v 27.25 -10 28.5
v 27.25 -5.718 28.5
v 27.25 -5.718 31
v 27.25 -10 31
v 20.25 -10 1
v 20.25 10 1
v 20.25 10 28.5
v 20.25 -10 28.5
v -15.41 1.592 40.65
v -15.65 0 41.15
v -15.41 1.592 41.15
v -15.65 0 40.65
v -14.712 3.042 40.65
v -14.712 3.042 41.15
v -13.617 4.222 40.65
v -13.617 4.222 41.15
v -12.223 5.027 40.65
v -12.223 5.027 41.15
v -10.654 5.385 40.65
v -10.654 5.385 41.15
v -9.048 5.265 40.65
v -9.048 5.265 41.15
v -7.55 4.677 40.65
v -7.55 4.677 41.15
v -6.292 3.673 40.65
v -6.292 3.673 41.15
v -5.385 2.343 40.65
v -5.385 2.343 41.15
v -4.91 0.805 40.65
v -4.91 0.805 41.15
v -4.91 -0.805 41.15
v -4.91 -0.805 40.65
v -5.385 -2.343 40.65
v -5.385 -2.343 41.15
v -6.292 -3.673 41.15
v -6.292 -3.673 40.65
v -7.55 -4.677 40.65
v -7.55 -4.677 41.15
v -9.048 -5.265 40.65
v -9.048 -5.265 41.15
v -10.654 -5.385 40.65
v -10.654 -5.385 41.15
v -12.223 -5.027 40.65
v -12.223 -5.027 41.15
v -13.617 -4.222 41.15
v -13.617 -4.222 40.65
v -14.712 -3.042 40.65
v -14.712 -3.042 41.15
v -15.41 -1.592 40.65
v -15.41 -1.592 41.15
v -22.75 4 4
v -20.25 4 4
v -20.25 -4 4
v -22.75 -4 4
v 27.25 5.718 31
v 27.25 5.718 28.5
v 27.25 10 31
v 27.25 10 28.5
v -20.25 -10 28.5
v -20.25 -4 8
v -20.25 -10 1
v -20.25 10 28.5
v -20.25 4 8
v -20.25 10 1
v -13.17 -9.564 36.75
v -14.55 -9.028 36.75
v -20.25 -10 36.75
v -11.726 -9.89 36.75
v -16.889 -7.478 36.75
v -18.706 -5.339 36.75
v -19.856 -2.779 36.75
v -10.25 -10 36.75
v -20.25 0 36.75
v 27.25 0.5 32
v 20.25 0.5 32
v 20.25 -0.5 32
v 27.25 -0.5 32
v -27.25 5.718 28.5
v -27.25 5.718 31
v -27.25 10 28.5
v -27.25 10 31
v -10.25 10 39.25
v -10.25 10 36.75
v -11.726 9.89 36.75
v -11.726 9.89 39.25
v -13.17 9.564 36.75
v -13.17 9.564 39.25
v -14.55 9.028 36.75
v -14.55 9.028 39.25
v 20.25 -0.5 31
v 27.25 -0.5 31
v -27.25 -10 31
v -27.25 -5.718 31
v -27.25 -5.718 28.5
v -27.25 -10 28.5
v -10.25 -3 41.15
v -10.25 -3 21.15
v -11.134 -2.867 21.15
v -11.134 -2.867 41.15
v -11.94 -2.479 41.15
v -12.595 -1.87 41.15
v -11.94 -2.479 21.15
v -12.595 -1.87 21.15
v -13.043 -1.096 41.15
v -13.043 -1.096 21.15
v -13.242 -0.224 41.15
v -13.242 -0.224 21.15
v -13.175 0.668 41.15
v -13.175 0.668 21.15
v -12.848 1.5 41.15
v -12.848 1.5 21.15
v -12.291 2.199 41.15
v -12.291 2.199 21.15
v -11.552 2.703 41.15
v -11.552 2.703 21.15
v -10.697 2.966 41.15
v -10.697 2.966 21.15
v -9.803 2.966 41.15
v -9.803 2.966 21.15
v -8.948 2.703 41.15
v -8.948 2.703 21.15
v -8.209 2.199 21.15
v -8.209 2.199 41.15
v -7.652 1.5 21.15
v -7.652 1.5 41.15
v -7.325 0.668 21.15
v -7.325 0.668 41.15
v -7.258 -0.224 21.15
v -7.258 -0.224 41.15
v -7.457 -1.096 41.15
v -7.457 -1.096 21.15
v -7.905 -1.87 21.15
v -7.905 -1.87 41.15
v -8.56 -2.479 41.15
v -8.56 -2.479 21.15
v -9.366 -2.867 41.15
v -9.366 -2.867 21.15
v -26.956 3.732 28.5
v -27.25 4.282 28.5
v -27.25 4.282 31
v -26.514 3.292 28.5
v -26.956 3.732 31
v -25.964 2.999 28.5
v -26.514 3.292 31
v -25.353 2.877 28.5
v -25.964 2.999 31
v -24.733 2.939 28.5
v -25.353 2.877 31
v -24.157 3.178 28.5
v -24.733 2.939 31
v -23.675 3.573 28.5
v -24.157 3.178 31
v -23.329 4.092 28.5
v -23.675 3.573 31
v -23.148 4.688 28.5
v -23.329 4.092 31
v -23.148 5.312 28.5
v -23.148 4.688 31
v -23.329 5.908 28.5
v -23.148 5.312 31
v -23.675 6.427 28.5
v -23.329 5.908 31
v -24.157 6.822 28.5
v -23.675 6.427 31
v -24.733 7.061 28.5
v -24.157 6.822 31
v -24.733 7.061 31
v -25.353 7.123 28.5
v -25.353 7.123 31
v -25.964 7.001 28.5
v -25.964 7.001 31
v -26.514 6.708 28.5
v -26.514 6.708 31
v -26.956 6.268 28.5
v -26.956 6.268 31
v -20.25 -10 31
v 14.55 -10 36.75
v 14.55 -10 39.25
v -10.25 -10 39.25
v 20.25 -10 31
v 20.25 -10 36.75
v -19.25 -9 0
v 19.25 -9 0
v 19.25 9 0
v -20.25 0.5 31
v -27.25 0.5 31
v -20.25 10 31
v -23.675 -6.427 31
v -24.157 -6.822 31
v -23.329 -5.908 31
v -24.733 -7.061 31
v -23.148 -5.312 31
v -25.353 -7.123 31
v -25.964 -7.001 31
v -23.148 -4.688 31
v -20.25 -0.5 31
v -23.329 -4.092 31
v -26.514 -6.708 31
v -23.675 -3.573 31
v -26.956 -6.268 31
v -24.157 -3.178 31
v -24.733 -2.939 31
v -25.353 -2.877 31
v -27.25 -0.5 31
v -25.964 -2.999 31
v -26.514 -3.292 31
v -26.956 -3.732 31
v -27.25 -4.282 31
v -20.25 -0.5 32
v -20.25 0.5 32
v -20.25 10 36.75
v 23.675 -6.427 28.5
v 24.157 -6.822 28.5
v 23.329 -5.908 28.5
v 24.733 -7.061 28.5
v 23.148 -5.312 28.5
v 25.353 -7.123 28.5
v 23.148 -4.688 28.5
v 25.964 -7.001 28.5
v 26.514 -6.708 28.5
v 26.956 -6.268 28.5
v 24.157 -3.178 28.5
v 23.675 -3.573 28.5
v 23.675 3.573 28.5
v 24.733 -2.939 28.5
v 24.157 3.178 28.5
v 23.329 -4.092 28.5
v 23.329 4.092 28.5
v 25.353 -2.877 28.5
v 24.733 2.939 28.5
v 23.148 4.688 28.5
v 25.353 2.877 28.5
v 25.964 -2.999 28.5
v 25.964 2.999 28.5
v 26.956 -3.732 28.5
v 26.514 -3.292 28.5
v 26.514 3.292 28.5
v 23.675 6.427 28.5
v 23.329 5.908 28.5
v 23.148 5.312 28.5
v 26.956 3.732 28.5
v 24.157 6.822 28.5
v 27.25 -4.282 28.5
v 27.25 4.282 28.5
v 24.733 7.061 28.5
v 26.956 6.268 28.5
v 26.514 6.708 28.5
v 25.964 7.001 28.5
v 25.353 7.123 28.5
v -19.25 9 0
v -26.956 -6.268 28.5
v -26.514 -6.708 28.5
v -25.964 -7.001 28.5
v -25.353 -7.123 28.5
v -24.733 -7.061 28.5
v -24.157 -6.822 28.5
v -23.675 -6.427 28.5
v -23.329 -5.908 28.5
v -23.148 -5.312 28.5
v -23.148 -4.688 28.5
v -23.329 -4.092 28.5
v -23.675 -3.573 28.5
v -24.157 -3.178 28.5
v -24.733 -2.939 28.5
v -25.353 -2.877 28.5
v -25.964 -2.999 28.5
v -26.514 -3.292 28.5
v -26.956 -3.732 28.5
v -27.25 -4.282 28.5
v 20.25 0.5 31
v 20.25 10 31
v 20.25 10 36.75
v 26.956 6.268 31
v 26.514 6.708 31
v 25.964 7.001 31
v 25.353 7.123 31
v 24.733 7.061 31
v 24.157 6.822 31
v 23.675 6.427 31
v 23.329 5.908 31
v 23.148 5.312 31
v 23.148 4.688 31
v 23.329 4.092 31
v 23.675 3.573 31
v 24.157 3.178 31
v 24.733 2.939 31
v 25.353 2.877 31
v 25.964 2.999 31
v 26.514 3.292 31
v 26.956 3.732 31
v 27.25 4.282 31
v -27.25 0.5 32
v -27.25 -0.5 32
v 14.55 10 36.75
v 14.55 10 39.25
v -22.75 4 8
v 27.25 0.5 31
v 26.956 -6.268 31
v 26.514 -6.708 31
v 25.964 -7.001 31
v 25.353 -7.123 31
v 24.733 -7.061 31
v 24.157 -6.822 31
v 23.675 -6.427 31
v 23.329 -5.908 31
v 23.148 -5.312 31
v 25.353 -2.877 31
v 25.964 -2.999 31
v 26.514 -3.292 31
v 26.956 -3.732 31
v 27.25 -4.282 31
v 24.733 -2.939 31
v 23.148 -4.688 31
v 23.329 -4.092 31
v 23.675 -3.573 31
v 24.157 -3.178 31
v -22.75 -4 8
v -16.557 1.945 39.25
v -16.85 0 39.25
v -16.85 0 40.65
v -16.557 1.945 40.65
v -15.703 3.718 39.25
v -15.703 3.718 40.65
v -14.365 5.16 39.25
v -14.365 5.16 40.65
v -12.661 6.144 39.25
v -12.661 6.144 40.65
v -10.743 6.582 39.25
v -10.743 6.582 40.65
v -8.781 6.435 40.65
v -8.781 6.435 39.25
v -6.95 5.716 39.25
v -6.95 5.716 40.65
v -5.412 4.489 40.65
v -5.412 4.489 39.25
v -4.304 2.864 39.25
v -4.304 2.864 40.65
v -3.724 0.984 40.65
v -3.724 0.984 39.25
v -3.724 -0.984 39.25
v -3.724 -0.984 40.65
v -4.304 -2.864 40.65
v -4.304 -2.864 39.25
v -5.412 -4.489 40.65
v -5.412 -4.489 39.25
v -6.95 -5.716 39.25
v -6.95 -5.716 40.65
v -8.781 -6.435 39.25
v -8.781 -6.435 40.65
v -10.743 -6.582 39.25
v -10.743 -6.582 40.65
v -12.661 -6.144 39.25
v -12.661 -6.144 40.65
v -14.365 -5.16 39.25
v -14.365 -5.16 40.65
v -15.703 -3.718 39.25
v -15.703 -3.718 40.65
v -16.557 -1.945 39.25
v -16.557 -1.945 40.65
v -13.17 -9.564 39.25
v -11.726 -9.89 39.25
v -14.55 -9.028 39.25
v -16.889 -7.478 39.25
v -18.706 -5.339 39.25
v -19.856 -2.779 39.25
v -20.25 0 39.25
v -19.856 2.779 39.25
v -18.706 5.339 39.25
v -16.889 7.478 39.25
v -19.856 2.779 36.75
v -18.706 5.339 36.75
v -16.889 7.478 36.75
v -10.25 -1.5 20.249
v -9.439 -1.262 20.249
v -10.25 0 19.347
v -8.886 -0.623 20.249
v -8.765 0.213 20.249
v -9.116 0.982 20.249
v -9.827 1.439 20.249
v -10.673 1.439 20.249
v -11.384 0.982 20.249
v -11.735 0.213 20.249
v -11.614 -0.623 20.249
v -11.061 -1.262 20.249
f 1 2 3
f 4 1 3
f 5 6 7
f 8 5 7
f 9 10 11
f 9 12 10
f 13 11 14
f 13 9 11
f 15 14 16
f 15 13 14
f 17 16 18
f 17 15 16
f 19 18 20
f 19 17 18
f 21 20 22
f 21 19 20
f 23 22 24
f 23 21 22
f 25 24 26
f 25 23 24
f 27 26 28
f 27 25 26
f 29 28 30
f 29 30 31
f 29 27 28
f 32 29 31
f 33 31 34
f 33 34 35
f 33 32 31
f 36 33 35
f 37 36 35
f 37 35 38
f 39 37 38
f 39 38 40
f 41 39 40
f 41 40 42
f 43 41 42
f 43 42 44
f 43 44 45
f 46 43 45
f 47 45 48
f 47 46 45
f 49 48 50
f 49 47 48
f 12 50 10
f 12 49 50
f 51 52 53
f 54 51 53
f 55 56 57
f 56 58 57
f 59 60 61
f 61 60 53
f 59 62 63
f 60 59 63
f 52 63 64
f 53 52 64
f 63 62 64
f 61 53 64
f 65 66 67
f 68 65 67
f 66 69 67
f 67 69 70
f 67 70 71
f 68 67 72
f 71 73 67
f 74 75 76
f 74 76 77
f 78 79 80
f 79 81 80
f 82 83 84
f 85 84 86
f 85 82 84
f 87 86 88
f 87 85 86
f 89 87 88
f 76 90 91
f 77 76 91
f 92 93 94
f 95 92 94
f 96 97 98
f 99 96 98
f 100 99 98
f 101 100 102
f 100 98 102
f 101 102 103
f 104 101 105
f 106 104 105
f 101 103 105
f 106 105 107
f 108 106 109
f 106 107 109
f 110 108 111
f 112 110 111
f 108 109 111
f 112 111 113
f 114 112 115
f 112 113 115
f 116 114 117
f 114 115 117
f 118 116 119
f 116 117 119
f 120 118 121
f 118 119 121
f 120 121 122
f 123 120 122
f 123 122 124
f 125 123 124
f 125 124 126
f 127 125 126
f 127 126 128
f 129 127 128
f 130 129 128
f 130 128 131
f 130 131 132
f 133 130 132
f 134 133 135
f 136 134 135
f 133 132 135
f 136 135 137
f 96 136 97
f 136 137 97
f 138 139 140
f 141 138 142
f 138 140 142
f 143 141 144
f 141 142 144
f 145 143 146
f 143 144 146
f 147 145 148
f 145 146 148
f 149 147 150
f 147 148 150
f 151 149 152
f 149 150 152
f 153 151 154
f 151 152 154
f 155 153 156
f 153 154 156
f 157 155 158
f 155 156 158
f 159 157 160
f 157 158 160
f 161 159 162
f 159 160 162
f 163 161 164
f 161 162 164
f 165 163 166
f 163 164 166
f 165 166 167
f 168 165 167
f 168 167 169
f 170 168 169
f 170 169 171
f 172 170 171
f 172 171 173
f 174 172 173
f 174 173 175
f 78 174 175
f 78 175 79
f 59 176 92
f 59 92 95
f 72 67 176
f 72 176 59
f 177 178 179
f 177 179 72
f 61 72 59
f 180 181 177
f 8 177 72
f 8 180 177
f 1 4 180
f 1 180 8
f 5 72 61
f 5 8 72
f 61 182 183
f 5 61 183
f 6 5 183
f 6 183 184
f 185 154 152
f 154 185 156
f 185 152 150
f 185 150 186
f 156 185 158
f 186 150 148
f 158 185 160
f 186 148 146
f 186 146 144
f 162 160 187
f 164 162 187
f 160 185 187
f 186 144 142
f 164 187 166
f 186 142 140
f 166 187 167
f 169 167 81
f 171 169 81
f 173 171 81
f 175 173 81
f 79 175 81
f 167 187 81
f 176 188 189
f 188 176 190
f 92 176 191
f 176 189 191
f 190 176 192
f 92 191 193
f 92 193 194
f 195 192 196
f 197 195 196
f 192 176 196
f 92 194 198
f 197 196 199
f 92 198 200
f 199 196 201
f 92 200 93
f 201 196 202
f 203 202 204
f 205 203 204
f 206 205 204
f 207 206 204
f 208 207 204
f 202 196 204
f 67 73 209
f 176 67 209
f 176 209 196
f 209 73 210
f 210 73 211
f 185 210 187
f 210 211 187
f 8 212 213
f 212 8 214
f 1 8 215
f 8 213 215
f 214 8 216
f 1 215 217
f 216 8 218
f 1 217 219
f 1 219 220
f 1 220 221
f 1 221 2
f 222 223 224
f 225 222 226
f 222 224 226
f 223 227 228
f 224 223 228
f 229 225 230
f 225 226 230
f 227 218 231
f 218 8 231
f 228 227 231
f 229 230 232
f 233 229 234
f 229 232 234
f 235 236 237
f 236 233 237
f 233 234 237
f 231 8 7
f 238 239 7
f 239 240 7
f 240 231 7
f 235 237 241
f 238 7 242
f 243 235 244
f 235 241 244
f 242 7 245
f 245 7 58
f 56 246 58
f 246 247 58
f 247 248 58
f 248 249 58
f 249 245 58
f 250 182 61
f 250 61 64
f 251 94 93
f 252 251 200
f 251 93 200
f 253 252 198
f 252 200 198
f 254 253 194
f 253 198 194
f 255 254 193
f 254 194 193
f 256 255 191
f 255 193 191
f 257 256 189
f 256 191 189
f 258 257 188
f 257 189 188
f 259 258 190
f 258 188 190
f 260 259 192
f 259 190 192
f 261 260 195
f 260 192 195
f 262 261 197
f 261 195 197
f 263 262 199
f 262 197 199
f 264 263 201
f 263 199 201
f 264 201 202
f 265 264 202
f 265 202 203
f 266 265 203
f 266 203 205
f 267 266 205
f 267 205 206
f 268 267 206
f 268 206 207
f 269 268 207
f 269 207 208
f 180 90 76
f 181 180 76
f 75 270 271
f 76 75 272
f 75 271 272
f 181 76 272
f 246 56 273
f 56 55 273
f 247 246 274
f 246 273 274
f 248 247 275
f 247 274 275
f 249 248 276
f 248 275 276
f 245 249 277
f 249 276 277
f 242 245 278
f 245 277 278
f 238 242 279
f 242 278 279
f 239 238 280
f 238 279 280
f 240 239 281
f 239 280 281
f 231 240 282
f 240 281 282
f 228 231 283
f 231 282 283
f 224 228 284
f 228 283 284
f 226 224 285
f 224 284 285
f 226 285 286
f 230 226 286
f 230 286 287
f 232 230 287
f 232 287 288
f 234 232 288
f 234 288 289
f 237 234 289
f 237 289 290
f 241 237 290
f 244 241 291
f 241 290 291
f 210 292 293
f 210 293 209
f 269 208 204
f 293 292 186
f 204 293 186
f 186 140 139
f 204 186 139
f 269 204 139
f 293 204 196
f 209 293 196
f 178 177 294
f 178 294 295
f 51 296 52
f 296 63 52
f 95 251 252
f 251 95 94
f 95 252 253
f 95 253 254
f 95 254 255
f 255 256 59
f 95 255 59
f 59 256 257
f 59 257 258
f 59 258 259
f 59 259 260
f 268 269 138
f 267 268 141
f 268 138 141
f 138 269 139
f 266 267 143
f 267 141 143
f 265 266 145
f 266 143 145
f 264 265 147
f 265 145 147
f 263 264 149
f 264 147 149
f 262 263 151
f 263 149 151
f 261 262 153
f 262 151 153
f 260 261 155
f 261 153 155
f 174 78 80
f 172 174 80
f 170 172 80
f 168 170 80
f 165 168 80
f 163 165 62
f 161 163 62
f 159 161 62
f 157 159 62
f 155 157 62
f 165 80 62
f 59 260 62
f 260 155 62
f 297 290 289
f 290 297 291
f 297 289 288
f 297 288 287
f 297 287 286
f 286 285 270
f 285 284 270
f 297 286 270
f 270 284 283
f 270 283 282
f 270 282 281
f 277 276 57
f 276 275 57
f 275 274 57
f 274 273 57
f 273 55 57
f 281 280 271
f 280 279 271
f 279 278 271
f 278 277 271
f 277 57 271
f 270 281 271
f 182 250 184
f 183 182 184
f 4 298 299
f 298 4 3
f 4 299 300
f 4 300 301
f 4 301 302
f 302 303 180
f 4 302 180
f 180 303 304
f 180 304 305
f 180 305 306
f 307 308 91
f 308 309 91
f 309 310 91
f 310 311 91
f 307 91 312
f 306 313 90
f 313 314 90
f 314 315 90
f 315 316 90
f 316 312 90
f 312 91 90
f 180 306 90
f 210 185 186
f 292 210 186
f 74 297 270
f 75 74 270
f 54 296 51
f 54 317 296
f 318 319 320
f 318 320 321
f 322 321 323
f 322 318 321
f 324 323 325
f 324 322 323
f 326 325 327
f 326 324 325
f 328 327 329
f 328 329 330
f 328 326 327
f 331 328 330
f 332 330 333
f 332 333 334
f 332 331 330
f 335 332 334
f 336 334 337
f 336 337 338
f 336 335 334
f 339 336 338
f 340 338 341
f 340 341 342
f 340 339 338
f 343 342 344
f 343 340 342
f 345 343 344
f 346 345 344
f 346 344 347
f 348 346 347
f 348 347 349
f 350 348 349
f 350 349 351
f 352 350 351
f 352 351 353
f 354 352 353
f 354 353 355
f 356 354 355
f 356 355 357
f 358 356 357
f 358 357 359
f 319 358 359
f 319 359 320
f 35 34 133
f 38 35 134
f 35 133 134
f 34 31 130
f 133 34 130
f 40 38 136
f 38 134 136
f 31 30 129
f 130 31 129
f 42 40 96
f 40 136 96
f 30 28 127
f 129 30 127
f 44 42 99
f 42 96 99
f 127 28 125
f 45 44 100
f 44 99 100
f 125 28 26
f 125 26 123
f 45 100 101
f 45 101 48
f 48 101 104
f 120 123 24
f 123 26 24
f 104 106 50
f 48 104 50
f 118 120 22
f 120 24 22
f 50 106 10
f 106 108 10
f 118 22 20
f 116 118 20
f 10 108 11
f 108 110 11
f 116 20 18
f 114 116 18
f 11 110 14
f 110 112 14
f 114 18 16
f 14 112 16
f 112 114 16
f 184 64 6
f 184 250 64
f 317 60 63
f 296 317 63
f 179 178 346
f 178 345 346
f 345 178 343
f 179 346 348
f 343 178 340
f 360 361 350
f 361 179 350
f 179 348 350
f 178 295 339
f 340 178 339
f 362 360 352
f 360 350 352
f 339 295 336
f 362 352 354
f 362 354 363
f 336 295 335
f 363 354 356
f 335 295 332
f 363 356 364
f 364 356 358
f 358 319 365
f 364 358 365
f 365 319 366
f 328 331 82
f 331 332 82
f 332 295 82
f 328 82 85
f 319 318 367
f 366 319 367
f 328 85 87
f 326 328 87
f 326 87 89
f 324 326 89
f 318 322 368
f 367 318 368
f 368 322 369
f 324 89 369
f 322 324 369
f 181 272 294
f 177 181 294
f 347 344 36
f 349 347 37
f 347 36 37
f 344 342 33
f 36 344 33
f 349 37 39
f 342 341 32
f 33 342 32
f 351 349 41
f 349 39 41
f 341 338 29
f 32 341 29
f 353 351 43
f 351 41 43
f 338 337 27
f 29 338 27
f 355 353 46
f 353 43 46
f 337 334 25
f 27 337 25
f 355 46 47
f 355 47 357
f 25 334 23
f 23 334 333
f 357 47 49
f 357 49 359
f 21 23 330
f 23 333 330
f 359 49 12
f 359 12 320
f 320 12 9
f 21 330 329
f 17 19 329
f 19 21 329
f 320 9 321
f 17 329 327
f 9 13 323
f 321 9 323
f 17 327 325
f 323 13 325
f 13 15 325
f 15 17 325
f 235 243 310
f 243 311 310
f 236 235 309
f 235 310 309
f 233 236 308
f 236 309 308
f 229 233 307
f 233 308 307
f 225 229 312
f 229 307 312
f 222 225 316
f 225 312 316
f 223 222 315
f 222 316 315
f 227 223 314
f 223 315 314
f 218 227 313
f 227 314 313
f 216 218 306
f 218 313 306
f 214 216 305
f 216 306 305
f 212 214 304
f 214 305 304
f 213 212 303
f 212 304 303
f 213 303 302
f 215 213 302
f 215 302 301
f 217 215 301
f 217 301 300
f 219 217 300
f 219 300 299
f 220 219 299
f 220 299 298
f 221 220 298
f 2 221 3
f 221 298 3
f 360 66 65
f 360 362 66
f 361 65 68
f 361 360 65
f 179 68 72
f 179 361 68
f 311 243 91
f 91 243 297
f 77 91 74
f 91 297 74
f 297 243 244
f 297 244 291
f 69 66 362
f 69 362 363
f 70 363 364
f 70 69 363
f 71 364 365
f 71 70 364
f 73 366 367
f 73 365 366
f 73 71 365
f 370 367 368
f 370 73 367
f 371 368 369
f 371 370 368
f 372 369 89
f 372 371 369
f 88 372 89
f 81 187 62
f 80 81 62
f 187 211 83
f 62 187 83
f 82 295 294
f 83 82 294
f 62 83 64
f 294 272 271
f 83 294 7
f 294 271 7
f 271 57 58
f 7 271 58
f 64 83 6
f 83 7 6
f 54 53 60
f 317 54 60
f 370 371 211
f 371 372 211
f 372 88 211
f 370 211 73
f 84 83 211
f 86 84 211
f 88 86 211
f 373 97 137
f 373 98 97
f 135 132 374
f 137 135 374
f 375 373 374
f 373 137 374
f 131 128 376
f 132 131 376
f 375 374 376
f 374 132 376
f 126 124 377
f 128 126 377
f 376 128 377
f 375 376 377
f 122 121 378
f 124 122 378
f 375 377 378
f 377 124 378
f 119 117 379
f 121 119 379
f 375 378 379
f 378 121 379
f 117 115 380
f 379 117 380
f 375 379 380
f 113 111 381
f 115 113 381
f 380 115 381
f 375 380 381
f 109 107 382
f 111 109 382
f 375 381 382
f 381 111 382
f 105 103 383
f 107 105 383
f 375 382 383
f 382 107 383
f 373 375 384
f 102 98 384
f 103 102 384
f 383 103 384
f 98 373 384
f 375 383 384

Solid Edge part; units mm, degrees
sketch "Sketch1" plane through (0, 0, 0) normal (0, -1, 0) x (1, 0, 0)
  line L0 (-20.25, 28.5) -> (-20.25, 0)
  line L1 (-20.25, 0) -> (20.25, 0)
  line L2 (20.25, 0) -> (20.25, 28.5)
  line L3 (20.25, 28.5) -> (27.25, 28.5)
  line L4 (27.25, 28.5) -> (27.25, 31)
  line L5 (27.25, 31) -> (20.25, 31)
  line L6 (20.25, 31) -> (20.25, 36.75)
  line L7 (20.25, 36.75) -> (14.55, 36.75)
  line L8 (14.55, 36.75) -> (14.55, 39.25)
  line L9 (14.55, 39.25) -> (-14.55, 39.25)
  line L10 (-14.55, 39.25) -> (-14.55, 36.75)
  line L11 (-14.55, 36.75) -> (-20.25, 36.75)
  line L12 (-20.25, 36.75) -> (-20.25, 31)
  line L13 (-20.25, 31) -> (-27.25, 31)
  line L14 (-27.25, 31) -> (-27.25, 28.5)
  line L15 (-27.25, 28.5) -> (-20.25, 28.5)
  dimension "D1" = 40.5
  dimension "D2" = 54.5
  dimension "D3" = 5.7
  dimension "D4" = 39.25
  dimension "D5" = 36.75
  dimension "D6" = 28.5
  dimension "D7" = 2.5
extrude "Protrusion1" add sketch "Sketch1" along normal mid plane 20
hole "Hole_1" at (25.25, 5, 31) direction (0, 0, -1) diameter 4.25 end up to next
hole "Hole1" at (25.25, -5, 31) direction (0, 0, -1) diameter 4.25 end up to next
sketch "Sketch2" plane through (0, 0, 0) normal (0, -1, 0) x (1, 0, 0)
  line L0 (-20.25, 36.75) -> (-10.25, 36.75)
  line L1 (-10.25, 36.75) -> (-10.25, 41.15)
  line L2 (-10.25, 41.15) -> (-15.65, 41.15)
  line L3 (-15.65, 41.15) -> (-15.65, 40.65)
  line L4 (-15.65, 40.65) -> (-16.85, 40.65)
  line L5 (-16.85, 40.65) -> (-16.85, 39.25)
  line L6 (-16.85, 39.25) -> (-20.25, 39.25)
  line L7 (-20.25, 39.25) -> (-20.25, 36.75)
  dimension "D1" = 10
  dimension "D2" = 50
  dimension "D3" = 1.4
  dimension "D4" = 0.5
revolve "RevolvedProtrusion1" add sketch "Sketch2" angle 360 about axis through (-10.25, 0, 50) along (0, 0, -1)
sketch "Sketch3" plane through (-20.25, 0, 14.25) normal (-1, 0, 0) x (0, -1, 0)
  line L0 (-4, -10.25) -> (4, -10.25)
  line L1 (4, -10.25) -> (4, -6.25)
  line L2 (4, -6.25) -> (-4, -6.25)
  line L3 (-4, -6.25) -> (-4, -10.25)
  dimension "D1" = 4
  dimension "D2" = 8
  dimension "D3" = 4
extrude "ExtrudedProtrusion_2" add sketch "Sketch3" along normal blind 2.5
sketch "Sketch4" plane through (-10.25, 0, 41.15) normal (0, 0, 1) x (1, 0, 0)
  arc A0 (-4.3, 9.0283) -> (0, 10) centre (0, 0) cw
  line L0 (-4.3, 10) -> (0, 10)
  line L1 (-4.3, 9.0283) -> (-4.3, 10)
  arc A1 (-4.3, -9.0283) -> (0, -10) centre (0, 0) ccw
  line L2 (-4.3, -10) -> (0, -10)
  line L3 (-4.3, -9.0283) -> (-4.3, -10)
extrude "Cutout1" cut sketch "Sketch4" against normal up to vertex (4.4 mm away)
hole "Hole_3" at (-10.25, 0, 41.15) direction (0, 0, -1) diameter 6 depth 20 tip angle 118
chamfer "Chamfer_1" distance 1 angle 45 4 edges at (-20.25, 0, 0) (0, -10, 0) (20.25, 0, 0) (0, 10, 0)
sketch "Sketch5" plane through (23.75, 0, 31) normal (0, 0, 1) x (-1, 0, 0)
  line L0 (3.5, -0.5) -> (3.5, 0.5)
  line L1 (3.5, 0.5) -> (-3.5, 0.5)
  line L2 (-3.5, 0.5) -> (-3.5, -0.5)
  line L3 (-3.5, -0.5) -> (3.5, -0.5)
  dimension "D1" = 1
extrude "ExtrudedProtrusion_3" add sketch "Sketch5" along normal blind 1
mirror "Mirror1" about plane through (0, 0, 0) normal (1, 0, 0) of "Hole_1", "Hole1", "ExtrudedProtrusion_3"
properties material "ABS Plastic, medium impact"
